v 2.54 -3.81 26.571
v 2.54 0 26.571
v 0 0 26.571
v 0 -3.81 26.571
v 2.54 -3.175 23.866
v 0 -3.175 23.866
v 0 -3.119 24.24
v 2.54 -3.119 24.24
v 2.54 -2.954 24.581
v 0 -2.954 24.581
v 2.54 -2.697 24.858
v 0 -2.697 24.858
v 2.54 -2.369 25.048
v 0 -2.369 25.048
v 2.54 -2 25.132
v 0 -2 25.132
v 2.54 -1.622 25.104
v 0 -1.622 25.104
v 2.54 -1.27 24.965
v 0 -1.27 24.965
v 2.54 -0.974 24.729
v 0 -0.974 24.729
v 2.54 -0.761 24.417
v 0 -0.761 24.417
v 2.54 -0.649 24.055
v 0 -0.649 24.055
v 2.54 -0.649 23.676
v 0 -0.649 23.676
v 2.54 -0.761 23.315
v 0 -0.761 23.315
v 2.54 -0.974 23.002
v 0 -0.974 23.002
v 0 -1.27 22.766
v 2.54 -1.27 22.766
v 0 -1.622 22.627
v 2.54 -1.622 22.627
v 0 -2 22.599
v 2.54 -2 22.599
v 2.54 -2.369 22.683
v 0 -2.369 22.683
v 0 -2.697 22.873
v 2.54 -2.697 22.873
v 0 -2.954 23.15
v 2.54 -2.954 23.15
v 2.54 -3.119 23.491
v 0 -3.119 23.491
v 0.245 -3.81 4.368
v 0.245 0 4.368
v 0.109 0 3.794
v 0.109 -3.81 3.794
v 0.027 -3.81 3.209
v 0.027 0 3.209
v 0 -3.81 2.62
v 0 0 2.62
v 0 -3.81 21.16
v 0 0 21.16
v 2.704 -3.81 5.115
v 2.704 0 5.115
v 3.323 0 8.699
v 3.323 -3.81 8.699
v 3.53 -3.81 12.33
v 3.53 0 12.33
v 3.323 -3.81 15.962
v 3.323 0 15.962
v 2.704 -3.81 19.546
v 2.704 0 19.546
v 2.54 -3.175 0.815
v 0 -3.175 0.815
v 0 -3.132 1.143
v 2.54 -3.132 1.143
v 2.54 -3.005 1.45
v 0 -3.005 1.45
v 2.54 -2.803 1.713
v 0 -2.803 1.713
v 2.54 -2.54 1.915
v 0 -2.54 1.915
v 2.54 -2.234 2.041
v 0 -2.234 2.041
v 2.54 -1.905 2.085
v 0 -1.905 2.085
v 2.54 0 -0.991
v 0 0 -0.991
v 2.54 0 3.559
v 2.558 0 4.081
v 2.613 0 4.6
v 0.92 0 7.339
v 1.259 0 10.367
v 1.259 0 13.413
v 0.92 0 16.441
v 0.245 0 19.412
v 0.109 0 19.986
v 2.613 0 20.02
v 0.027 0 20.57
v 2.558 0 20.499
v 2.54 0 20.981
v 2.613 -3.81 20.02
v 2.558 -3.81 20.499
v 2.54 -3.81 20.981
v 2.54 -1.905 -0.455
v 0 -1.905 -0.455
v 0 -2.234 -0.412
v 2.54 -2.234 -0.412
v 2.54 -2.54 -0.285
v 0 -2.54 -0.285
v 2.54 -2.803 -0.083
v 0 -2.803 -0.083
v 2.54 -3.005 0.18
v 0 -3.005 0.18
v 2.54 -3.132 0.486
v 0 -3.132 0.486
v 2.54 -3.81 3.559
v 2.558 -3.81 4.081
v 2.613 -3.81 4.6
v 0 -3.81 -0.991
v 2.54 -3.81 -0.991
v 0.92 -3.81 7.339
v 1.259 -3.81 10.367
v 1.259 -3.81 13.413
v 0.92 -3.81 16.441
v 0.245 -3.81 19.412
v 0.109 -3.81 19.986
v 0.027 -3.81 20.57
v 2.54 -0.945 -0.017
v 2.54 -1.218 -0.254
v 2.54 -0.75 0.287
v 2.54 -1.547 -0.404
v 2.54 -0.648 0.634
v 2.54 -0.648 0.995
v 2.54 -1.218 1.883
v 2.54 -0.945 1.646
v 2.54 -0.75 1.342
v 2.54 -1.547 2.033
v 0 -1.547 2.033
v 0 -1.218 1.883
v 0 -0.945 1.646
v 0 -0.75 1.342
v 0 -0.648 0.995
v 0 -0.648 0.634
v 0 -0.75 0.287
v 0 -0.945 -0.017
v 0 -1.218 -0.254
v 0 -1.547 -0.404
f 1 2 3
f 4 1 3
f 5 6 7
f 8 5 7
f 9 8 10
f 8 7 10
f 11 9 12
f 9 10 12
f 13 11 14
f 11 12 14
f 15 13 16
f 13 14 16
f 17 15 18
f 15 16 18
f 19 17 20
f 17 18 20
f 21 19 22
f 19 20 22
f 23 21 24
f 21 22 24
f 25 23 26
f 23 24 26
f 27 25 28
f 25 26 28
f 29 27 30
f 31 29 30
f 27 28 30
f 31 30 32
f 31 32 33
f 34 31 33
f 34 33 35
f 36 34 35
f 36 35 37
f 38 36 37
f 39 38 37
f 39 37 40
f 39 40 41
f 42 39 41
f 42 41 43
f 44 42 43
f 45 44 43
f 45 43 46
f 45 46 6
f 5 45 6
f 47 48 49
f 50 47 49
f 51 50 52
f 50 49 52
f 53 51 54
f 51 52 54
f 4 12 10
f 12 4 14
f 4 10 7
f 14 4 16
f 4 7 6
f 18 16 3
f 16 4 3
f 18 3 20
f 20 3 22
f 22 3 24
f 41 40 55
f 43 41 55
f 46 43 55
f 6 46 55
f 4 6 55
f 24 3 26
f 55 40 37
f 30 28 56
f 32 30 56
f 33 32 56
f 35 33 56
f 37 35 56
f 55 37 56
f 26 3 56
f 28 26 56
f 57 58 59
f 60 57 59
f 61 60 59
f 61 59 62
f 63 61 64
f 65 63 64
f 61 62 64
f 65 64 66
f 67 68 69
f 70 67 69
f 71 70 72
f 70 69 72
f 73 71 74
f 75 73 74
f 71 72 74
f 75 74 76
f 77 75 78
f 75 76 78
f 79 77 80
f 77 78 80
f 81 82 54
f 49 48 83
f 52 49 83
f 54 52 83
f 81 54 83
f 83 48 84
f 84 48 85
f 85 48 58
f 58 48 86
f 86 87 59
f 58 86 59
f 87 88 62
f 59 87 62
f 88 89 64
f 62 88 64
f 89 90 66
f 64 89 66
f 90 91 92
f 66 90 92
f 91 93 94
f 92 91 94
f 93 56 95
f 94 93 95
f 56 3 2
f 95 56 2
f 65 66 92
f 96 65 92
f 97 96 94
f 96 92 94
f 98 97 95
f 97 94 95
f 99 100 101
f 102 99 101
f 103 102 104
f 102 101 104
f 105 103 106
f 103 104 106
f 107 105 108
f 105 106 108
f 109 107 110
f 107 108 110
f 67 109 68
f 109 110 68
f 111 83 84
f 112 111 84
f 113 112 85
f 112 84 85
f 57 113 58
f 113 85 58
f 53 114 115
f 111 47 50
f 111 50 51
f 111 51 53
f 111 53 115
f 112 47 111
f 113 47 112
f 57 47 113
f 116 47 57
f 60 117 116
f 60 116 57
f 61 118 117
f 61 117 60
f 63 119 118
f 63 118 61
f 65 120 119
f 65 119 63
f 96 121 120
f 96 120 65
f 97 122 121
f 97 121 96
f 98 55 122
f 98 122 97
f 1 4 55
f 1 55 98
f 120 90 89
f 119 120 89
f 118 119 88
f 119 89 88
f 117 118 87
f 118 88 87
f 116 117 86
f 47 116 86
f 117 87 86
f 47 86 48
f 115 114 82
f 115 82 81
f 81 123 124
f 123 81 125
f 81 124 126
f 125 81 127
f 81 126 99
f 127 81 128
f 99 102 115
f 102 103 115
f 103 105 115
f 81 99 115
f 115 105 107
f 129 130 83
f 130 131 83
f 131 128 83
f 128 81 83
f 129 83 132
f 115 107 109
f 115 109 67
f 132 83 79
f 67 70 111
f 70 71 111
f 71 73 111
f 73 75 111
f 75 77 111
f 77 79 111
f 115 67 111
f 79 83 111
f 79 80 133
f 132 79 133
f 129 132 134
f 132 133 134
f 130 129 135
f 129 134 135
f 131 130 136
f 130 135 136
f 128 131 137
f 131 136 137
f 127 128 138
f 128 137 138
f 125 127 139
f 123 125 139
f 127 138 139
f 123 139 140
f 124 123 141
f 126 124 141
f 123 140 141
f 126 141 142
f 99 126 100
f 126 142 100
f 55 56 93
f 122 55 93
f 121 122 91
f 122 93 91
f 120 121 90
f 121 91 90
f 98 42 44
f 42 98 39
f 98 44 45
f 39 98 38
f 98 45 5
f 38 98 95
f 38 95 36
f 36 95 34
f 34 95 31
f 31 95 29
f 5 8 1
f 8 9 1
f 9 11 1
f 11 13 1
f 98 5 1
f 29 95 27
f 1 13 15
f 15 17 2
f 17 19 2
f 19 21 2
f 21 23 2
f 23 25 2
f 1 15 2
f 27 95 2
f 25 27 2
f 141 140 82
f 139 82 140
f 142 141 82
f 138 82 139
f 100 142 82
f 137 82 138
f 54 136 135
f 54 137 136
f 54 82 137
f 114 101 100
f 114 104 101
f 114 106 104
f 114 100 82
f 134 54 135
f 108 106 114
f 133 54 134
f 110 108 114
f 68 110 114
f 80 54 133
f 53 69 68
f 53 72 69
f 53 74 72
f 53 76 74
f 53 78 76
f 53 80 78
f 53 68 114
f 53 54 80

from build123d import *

# Parameters (mm, degrees)
F1_DEPTH = 3.81
F2_R     = 1.27
F3_DEPTH = 10.668
F4_W     = 2.54
F4_H     = 3.81
F5_DEPTH = 0.9906
F7_DEPTH = 25.4


with BuildPart() as f1:
    # F0 (on Front) → F1 (new body)
    with BuildSketch(Plane.XZ):
        with BuildLine():
            Line((0, 2.619967), (0, 0))
            Line((0, 0), (2.54, 0))
            Line((2.54, 0), (2.54, 3.558869))
            ThreePointArc((2.54, 3.558869), (2.581181, 4.341032), (2.704268, 5.114547))
            ThreePointArc((2.704268, 5.114547), (3.530295, 12.330484), (2.704268, 19.546421))
            ThreePointArc((2.704268, 19.546421), (2.581201, 20.259234), (2.54, 20.981419))
            Line((2.54, 20.981419), (2.54, 26.571107))
            Line((2.54, 26.571107), (0, 26.571107))
            Line((0, 26.571107), (0, 21.160008))
            ThreePointArc((0, 21.160008), (0.06165, 20.277308), (0.245405, 19.411748))
            ThreePointArc((0.245405, 19.411748), (1.301239, 11.889988), (0.245405, 4.368227))
            ThreePointArc((0.245405, 4.368227), (0.06165, 3.502667), (0, 2.619967))
        make_face()
    extrude(amount=F1_DEPTH)

    # F2 (on face) → F3 (cut)
    with BuildSketch(Plane(origin=(0, 0, 0), x_dir=(0, -1, 0), z_dir=(-1, 0, 0))):
        with Locations((1.905, 23.865558)):
            Circle(F2_R)
    extrude(amount=-F3_DEPTH, mode=Mode.SUBTRACT)

    # F4 (on face) → F5 (join)
    with BuildSketch(Plane(origin=(0, 0, 0), x_dir=(1, 0, 0), z_dir=(0, 0, -1))):
        with Locations((1.27, 1.905)):
            Rectangle(F4_W, F4_H)
    extrude(amount=F5_DEPTH)

    # F6 (on face) → F7 (cut)
    with BuildSketch(Plane(origin=(0, 0, 0), x_dir=(0, -1, 0), z_dir=(-1, 0, 0))):
        with BuildLine():
            ThreePointArc((3.175, 0.814683), (2.803026, 1.712709), (1.905, 2.084683))
            Line((1.905, 2.084683), (1.905, -0.455317))
            ThreePointArc((1.905, -0.455317), (2.803026, -0.083342), (3.175, 0.814683))
        make_face()
        with BuildLine():
            Line((1.905, -0.455317), (1.905, 2.084683))
            ThreePointArc((1.905, 2.084683), (0.635, 0.814683), (1.905, -0.455317))
        make_face()
    extrude(amount=-F7_DEPTH, mode=Mode.SUBTRACT)


solid = f1.part
